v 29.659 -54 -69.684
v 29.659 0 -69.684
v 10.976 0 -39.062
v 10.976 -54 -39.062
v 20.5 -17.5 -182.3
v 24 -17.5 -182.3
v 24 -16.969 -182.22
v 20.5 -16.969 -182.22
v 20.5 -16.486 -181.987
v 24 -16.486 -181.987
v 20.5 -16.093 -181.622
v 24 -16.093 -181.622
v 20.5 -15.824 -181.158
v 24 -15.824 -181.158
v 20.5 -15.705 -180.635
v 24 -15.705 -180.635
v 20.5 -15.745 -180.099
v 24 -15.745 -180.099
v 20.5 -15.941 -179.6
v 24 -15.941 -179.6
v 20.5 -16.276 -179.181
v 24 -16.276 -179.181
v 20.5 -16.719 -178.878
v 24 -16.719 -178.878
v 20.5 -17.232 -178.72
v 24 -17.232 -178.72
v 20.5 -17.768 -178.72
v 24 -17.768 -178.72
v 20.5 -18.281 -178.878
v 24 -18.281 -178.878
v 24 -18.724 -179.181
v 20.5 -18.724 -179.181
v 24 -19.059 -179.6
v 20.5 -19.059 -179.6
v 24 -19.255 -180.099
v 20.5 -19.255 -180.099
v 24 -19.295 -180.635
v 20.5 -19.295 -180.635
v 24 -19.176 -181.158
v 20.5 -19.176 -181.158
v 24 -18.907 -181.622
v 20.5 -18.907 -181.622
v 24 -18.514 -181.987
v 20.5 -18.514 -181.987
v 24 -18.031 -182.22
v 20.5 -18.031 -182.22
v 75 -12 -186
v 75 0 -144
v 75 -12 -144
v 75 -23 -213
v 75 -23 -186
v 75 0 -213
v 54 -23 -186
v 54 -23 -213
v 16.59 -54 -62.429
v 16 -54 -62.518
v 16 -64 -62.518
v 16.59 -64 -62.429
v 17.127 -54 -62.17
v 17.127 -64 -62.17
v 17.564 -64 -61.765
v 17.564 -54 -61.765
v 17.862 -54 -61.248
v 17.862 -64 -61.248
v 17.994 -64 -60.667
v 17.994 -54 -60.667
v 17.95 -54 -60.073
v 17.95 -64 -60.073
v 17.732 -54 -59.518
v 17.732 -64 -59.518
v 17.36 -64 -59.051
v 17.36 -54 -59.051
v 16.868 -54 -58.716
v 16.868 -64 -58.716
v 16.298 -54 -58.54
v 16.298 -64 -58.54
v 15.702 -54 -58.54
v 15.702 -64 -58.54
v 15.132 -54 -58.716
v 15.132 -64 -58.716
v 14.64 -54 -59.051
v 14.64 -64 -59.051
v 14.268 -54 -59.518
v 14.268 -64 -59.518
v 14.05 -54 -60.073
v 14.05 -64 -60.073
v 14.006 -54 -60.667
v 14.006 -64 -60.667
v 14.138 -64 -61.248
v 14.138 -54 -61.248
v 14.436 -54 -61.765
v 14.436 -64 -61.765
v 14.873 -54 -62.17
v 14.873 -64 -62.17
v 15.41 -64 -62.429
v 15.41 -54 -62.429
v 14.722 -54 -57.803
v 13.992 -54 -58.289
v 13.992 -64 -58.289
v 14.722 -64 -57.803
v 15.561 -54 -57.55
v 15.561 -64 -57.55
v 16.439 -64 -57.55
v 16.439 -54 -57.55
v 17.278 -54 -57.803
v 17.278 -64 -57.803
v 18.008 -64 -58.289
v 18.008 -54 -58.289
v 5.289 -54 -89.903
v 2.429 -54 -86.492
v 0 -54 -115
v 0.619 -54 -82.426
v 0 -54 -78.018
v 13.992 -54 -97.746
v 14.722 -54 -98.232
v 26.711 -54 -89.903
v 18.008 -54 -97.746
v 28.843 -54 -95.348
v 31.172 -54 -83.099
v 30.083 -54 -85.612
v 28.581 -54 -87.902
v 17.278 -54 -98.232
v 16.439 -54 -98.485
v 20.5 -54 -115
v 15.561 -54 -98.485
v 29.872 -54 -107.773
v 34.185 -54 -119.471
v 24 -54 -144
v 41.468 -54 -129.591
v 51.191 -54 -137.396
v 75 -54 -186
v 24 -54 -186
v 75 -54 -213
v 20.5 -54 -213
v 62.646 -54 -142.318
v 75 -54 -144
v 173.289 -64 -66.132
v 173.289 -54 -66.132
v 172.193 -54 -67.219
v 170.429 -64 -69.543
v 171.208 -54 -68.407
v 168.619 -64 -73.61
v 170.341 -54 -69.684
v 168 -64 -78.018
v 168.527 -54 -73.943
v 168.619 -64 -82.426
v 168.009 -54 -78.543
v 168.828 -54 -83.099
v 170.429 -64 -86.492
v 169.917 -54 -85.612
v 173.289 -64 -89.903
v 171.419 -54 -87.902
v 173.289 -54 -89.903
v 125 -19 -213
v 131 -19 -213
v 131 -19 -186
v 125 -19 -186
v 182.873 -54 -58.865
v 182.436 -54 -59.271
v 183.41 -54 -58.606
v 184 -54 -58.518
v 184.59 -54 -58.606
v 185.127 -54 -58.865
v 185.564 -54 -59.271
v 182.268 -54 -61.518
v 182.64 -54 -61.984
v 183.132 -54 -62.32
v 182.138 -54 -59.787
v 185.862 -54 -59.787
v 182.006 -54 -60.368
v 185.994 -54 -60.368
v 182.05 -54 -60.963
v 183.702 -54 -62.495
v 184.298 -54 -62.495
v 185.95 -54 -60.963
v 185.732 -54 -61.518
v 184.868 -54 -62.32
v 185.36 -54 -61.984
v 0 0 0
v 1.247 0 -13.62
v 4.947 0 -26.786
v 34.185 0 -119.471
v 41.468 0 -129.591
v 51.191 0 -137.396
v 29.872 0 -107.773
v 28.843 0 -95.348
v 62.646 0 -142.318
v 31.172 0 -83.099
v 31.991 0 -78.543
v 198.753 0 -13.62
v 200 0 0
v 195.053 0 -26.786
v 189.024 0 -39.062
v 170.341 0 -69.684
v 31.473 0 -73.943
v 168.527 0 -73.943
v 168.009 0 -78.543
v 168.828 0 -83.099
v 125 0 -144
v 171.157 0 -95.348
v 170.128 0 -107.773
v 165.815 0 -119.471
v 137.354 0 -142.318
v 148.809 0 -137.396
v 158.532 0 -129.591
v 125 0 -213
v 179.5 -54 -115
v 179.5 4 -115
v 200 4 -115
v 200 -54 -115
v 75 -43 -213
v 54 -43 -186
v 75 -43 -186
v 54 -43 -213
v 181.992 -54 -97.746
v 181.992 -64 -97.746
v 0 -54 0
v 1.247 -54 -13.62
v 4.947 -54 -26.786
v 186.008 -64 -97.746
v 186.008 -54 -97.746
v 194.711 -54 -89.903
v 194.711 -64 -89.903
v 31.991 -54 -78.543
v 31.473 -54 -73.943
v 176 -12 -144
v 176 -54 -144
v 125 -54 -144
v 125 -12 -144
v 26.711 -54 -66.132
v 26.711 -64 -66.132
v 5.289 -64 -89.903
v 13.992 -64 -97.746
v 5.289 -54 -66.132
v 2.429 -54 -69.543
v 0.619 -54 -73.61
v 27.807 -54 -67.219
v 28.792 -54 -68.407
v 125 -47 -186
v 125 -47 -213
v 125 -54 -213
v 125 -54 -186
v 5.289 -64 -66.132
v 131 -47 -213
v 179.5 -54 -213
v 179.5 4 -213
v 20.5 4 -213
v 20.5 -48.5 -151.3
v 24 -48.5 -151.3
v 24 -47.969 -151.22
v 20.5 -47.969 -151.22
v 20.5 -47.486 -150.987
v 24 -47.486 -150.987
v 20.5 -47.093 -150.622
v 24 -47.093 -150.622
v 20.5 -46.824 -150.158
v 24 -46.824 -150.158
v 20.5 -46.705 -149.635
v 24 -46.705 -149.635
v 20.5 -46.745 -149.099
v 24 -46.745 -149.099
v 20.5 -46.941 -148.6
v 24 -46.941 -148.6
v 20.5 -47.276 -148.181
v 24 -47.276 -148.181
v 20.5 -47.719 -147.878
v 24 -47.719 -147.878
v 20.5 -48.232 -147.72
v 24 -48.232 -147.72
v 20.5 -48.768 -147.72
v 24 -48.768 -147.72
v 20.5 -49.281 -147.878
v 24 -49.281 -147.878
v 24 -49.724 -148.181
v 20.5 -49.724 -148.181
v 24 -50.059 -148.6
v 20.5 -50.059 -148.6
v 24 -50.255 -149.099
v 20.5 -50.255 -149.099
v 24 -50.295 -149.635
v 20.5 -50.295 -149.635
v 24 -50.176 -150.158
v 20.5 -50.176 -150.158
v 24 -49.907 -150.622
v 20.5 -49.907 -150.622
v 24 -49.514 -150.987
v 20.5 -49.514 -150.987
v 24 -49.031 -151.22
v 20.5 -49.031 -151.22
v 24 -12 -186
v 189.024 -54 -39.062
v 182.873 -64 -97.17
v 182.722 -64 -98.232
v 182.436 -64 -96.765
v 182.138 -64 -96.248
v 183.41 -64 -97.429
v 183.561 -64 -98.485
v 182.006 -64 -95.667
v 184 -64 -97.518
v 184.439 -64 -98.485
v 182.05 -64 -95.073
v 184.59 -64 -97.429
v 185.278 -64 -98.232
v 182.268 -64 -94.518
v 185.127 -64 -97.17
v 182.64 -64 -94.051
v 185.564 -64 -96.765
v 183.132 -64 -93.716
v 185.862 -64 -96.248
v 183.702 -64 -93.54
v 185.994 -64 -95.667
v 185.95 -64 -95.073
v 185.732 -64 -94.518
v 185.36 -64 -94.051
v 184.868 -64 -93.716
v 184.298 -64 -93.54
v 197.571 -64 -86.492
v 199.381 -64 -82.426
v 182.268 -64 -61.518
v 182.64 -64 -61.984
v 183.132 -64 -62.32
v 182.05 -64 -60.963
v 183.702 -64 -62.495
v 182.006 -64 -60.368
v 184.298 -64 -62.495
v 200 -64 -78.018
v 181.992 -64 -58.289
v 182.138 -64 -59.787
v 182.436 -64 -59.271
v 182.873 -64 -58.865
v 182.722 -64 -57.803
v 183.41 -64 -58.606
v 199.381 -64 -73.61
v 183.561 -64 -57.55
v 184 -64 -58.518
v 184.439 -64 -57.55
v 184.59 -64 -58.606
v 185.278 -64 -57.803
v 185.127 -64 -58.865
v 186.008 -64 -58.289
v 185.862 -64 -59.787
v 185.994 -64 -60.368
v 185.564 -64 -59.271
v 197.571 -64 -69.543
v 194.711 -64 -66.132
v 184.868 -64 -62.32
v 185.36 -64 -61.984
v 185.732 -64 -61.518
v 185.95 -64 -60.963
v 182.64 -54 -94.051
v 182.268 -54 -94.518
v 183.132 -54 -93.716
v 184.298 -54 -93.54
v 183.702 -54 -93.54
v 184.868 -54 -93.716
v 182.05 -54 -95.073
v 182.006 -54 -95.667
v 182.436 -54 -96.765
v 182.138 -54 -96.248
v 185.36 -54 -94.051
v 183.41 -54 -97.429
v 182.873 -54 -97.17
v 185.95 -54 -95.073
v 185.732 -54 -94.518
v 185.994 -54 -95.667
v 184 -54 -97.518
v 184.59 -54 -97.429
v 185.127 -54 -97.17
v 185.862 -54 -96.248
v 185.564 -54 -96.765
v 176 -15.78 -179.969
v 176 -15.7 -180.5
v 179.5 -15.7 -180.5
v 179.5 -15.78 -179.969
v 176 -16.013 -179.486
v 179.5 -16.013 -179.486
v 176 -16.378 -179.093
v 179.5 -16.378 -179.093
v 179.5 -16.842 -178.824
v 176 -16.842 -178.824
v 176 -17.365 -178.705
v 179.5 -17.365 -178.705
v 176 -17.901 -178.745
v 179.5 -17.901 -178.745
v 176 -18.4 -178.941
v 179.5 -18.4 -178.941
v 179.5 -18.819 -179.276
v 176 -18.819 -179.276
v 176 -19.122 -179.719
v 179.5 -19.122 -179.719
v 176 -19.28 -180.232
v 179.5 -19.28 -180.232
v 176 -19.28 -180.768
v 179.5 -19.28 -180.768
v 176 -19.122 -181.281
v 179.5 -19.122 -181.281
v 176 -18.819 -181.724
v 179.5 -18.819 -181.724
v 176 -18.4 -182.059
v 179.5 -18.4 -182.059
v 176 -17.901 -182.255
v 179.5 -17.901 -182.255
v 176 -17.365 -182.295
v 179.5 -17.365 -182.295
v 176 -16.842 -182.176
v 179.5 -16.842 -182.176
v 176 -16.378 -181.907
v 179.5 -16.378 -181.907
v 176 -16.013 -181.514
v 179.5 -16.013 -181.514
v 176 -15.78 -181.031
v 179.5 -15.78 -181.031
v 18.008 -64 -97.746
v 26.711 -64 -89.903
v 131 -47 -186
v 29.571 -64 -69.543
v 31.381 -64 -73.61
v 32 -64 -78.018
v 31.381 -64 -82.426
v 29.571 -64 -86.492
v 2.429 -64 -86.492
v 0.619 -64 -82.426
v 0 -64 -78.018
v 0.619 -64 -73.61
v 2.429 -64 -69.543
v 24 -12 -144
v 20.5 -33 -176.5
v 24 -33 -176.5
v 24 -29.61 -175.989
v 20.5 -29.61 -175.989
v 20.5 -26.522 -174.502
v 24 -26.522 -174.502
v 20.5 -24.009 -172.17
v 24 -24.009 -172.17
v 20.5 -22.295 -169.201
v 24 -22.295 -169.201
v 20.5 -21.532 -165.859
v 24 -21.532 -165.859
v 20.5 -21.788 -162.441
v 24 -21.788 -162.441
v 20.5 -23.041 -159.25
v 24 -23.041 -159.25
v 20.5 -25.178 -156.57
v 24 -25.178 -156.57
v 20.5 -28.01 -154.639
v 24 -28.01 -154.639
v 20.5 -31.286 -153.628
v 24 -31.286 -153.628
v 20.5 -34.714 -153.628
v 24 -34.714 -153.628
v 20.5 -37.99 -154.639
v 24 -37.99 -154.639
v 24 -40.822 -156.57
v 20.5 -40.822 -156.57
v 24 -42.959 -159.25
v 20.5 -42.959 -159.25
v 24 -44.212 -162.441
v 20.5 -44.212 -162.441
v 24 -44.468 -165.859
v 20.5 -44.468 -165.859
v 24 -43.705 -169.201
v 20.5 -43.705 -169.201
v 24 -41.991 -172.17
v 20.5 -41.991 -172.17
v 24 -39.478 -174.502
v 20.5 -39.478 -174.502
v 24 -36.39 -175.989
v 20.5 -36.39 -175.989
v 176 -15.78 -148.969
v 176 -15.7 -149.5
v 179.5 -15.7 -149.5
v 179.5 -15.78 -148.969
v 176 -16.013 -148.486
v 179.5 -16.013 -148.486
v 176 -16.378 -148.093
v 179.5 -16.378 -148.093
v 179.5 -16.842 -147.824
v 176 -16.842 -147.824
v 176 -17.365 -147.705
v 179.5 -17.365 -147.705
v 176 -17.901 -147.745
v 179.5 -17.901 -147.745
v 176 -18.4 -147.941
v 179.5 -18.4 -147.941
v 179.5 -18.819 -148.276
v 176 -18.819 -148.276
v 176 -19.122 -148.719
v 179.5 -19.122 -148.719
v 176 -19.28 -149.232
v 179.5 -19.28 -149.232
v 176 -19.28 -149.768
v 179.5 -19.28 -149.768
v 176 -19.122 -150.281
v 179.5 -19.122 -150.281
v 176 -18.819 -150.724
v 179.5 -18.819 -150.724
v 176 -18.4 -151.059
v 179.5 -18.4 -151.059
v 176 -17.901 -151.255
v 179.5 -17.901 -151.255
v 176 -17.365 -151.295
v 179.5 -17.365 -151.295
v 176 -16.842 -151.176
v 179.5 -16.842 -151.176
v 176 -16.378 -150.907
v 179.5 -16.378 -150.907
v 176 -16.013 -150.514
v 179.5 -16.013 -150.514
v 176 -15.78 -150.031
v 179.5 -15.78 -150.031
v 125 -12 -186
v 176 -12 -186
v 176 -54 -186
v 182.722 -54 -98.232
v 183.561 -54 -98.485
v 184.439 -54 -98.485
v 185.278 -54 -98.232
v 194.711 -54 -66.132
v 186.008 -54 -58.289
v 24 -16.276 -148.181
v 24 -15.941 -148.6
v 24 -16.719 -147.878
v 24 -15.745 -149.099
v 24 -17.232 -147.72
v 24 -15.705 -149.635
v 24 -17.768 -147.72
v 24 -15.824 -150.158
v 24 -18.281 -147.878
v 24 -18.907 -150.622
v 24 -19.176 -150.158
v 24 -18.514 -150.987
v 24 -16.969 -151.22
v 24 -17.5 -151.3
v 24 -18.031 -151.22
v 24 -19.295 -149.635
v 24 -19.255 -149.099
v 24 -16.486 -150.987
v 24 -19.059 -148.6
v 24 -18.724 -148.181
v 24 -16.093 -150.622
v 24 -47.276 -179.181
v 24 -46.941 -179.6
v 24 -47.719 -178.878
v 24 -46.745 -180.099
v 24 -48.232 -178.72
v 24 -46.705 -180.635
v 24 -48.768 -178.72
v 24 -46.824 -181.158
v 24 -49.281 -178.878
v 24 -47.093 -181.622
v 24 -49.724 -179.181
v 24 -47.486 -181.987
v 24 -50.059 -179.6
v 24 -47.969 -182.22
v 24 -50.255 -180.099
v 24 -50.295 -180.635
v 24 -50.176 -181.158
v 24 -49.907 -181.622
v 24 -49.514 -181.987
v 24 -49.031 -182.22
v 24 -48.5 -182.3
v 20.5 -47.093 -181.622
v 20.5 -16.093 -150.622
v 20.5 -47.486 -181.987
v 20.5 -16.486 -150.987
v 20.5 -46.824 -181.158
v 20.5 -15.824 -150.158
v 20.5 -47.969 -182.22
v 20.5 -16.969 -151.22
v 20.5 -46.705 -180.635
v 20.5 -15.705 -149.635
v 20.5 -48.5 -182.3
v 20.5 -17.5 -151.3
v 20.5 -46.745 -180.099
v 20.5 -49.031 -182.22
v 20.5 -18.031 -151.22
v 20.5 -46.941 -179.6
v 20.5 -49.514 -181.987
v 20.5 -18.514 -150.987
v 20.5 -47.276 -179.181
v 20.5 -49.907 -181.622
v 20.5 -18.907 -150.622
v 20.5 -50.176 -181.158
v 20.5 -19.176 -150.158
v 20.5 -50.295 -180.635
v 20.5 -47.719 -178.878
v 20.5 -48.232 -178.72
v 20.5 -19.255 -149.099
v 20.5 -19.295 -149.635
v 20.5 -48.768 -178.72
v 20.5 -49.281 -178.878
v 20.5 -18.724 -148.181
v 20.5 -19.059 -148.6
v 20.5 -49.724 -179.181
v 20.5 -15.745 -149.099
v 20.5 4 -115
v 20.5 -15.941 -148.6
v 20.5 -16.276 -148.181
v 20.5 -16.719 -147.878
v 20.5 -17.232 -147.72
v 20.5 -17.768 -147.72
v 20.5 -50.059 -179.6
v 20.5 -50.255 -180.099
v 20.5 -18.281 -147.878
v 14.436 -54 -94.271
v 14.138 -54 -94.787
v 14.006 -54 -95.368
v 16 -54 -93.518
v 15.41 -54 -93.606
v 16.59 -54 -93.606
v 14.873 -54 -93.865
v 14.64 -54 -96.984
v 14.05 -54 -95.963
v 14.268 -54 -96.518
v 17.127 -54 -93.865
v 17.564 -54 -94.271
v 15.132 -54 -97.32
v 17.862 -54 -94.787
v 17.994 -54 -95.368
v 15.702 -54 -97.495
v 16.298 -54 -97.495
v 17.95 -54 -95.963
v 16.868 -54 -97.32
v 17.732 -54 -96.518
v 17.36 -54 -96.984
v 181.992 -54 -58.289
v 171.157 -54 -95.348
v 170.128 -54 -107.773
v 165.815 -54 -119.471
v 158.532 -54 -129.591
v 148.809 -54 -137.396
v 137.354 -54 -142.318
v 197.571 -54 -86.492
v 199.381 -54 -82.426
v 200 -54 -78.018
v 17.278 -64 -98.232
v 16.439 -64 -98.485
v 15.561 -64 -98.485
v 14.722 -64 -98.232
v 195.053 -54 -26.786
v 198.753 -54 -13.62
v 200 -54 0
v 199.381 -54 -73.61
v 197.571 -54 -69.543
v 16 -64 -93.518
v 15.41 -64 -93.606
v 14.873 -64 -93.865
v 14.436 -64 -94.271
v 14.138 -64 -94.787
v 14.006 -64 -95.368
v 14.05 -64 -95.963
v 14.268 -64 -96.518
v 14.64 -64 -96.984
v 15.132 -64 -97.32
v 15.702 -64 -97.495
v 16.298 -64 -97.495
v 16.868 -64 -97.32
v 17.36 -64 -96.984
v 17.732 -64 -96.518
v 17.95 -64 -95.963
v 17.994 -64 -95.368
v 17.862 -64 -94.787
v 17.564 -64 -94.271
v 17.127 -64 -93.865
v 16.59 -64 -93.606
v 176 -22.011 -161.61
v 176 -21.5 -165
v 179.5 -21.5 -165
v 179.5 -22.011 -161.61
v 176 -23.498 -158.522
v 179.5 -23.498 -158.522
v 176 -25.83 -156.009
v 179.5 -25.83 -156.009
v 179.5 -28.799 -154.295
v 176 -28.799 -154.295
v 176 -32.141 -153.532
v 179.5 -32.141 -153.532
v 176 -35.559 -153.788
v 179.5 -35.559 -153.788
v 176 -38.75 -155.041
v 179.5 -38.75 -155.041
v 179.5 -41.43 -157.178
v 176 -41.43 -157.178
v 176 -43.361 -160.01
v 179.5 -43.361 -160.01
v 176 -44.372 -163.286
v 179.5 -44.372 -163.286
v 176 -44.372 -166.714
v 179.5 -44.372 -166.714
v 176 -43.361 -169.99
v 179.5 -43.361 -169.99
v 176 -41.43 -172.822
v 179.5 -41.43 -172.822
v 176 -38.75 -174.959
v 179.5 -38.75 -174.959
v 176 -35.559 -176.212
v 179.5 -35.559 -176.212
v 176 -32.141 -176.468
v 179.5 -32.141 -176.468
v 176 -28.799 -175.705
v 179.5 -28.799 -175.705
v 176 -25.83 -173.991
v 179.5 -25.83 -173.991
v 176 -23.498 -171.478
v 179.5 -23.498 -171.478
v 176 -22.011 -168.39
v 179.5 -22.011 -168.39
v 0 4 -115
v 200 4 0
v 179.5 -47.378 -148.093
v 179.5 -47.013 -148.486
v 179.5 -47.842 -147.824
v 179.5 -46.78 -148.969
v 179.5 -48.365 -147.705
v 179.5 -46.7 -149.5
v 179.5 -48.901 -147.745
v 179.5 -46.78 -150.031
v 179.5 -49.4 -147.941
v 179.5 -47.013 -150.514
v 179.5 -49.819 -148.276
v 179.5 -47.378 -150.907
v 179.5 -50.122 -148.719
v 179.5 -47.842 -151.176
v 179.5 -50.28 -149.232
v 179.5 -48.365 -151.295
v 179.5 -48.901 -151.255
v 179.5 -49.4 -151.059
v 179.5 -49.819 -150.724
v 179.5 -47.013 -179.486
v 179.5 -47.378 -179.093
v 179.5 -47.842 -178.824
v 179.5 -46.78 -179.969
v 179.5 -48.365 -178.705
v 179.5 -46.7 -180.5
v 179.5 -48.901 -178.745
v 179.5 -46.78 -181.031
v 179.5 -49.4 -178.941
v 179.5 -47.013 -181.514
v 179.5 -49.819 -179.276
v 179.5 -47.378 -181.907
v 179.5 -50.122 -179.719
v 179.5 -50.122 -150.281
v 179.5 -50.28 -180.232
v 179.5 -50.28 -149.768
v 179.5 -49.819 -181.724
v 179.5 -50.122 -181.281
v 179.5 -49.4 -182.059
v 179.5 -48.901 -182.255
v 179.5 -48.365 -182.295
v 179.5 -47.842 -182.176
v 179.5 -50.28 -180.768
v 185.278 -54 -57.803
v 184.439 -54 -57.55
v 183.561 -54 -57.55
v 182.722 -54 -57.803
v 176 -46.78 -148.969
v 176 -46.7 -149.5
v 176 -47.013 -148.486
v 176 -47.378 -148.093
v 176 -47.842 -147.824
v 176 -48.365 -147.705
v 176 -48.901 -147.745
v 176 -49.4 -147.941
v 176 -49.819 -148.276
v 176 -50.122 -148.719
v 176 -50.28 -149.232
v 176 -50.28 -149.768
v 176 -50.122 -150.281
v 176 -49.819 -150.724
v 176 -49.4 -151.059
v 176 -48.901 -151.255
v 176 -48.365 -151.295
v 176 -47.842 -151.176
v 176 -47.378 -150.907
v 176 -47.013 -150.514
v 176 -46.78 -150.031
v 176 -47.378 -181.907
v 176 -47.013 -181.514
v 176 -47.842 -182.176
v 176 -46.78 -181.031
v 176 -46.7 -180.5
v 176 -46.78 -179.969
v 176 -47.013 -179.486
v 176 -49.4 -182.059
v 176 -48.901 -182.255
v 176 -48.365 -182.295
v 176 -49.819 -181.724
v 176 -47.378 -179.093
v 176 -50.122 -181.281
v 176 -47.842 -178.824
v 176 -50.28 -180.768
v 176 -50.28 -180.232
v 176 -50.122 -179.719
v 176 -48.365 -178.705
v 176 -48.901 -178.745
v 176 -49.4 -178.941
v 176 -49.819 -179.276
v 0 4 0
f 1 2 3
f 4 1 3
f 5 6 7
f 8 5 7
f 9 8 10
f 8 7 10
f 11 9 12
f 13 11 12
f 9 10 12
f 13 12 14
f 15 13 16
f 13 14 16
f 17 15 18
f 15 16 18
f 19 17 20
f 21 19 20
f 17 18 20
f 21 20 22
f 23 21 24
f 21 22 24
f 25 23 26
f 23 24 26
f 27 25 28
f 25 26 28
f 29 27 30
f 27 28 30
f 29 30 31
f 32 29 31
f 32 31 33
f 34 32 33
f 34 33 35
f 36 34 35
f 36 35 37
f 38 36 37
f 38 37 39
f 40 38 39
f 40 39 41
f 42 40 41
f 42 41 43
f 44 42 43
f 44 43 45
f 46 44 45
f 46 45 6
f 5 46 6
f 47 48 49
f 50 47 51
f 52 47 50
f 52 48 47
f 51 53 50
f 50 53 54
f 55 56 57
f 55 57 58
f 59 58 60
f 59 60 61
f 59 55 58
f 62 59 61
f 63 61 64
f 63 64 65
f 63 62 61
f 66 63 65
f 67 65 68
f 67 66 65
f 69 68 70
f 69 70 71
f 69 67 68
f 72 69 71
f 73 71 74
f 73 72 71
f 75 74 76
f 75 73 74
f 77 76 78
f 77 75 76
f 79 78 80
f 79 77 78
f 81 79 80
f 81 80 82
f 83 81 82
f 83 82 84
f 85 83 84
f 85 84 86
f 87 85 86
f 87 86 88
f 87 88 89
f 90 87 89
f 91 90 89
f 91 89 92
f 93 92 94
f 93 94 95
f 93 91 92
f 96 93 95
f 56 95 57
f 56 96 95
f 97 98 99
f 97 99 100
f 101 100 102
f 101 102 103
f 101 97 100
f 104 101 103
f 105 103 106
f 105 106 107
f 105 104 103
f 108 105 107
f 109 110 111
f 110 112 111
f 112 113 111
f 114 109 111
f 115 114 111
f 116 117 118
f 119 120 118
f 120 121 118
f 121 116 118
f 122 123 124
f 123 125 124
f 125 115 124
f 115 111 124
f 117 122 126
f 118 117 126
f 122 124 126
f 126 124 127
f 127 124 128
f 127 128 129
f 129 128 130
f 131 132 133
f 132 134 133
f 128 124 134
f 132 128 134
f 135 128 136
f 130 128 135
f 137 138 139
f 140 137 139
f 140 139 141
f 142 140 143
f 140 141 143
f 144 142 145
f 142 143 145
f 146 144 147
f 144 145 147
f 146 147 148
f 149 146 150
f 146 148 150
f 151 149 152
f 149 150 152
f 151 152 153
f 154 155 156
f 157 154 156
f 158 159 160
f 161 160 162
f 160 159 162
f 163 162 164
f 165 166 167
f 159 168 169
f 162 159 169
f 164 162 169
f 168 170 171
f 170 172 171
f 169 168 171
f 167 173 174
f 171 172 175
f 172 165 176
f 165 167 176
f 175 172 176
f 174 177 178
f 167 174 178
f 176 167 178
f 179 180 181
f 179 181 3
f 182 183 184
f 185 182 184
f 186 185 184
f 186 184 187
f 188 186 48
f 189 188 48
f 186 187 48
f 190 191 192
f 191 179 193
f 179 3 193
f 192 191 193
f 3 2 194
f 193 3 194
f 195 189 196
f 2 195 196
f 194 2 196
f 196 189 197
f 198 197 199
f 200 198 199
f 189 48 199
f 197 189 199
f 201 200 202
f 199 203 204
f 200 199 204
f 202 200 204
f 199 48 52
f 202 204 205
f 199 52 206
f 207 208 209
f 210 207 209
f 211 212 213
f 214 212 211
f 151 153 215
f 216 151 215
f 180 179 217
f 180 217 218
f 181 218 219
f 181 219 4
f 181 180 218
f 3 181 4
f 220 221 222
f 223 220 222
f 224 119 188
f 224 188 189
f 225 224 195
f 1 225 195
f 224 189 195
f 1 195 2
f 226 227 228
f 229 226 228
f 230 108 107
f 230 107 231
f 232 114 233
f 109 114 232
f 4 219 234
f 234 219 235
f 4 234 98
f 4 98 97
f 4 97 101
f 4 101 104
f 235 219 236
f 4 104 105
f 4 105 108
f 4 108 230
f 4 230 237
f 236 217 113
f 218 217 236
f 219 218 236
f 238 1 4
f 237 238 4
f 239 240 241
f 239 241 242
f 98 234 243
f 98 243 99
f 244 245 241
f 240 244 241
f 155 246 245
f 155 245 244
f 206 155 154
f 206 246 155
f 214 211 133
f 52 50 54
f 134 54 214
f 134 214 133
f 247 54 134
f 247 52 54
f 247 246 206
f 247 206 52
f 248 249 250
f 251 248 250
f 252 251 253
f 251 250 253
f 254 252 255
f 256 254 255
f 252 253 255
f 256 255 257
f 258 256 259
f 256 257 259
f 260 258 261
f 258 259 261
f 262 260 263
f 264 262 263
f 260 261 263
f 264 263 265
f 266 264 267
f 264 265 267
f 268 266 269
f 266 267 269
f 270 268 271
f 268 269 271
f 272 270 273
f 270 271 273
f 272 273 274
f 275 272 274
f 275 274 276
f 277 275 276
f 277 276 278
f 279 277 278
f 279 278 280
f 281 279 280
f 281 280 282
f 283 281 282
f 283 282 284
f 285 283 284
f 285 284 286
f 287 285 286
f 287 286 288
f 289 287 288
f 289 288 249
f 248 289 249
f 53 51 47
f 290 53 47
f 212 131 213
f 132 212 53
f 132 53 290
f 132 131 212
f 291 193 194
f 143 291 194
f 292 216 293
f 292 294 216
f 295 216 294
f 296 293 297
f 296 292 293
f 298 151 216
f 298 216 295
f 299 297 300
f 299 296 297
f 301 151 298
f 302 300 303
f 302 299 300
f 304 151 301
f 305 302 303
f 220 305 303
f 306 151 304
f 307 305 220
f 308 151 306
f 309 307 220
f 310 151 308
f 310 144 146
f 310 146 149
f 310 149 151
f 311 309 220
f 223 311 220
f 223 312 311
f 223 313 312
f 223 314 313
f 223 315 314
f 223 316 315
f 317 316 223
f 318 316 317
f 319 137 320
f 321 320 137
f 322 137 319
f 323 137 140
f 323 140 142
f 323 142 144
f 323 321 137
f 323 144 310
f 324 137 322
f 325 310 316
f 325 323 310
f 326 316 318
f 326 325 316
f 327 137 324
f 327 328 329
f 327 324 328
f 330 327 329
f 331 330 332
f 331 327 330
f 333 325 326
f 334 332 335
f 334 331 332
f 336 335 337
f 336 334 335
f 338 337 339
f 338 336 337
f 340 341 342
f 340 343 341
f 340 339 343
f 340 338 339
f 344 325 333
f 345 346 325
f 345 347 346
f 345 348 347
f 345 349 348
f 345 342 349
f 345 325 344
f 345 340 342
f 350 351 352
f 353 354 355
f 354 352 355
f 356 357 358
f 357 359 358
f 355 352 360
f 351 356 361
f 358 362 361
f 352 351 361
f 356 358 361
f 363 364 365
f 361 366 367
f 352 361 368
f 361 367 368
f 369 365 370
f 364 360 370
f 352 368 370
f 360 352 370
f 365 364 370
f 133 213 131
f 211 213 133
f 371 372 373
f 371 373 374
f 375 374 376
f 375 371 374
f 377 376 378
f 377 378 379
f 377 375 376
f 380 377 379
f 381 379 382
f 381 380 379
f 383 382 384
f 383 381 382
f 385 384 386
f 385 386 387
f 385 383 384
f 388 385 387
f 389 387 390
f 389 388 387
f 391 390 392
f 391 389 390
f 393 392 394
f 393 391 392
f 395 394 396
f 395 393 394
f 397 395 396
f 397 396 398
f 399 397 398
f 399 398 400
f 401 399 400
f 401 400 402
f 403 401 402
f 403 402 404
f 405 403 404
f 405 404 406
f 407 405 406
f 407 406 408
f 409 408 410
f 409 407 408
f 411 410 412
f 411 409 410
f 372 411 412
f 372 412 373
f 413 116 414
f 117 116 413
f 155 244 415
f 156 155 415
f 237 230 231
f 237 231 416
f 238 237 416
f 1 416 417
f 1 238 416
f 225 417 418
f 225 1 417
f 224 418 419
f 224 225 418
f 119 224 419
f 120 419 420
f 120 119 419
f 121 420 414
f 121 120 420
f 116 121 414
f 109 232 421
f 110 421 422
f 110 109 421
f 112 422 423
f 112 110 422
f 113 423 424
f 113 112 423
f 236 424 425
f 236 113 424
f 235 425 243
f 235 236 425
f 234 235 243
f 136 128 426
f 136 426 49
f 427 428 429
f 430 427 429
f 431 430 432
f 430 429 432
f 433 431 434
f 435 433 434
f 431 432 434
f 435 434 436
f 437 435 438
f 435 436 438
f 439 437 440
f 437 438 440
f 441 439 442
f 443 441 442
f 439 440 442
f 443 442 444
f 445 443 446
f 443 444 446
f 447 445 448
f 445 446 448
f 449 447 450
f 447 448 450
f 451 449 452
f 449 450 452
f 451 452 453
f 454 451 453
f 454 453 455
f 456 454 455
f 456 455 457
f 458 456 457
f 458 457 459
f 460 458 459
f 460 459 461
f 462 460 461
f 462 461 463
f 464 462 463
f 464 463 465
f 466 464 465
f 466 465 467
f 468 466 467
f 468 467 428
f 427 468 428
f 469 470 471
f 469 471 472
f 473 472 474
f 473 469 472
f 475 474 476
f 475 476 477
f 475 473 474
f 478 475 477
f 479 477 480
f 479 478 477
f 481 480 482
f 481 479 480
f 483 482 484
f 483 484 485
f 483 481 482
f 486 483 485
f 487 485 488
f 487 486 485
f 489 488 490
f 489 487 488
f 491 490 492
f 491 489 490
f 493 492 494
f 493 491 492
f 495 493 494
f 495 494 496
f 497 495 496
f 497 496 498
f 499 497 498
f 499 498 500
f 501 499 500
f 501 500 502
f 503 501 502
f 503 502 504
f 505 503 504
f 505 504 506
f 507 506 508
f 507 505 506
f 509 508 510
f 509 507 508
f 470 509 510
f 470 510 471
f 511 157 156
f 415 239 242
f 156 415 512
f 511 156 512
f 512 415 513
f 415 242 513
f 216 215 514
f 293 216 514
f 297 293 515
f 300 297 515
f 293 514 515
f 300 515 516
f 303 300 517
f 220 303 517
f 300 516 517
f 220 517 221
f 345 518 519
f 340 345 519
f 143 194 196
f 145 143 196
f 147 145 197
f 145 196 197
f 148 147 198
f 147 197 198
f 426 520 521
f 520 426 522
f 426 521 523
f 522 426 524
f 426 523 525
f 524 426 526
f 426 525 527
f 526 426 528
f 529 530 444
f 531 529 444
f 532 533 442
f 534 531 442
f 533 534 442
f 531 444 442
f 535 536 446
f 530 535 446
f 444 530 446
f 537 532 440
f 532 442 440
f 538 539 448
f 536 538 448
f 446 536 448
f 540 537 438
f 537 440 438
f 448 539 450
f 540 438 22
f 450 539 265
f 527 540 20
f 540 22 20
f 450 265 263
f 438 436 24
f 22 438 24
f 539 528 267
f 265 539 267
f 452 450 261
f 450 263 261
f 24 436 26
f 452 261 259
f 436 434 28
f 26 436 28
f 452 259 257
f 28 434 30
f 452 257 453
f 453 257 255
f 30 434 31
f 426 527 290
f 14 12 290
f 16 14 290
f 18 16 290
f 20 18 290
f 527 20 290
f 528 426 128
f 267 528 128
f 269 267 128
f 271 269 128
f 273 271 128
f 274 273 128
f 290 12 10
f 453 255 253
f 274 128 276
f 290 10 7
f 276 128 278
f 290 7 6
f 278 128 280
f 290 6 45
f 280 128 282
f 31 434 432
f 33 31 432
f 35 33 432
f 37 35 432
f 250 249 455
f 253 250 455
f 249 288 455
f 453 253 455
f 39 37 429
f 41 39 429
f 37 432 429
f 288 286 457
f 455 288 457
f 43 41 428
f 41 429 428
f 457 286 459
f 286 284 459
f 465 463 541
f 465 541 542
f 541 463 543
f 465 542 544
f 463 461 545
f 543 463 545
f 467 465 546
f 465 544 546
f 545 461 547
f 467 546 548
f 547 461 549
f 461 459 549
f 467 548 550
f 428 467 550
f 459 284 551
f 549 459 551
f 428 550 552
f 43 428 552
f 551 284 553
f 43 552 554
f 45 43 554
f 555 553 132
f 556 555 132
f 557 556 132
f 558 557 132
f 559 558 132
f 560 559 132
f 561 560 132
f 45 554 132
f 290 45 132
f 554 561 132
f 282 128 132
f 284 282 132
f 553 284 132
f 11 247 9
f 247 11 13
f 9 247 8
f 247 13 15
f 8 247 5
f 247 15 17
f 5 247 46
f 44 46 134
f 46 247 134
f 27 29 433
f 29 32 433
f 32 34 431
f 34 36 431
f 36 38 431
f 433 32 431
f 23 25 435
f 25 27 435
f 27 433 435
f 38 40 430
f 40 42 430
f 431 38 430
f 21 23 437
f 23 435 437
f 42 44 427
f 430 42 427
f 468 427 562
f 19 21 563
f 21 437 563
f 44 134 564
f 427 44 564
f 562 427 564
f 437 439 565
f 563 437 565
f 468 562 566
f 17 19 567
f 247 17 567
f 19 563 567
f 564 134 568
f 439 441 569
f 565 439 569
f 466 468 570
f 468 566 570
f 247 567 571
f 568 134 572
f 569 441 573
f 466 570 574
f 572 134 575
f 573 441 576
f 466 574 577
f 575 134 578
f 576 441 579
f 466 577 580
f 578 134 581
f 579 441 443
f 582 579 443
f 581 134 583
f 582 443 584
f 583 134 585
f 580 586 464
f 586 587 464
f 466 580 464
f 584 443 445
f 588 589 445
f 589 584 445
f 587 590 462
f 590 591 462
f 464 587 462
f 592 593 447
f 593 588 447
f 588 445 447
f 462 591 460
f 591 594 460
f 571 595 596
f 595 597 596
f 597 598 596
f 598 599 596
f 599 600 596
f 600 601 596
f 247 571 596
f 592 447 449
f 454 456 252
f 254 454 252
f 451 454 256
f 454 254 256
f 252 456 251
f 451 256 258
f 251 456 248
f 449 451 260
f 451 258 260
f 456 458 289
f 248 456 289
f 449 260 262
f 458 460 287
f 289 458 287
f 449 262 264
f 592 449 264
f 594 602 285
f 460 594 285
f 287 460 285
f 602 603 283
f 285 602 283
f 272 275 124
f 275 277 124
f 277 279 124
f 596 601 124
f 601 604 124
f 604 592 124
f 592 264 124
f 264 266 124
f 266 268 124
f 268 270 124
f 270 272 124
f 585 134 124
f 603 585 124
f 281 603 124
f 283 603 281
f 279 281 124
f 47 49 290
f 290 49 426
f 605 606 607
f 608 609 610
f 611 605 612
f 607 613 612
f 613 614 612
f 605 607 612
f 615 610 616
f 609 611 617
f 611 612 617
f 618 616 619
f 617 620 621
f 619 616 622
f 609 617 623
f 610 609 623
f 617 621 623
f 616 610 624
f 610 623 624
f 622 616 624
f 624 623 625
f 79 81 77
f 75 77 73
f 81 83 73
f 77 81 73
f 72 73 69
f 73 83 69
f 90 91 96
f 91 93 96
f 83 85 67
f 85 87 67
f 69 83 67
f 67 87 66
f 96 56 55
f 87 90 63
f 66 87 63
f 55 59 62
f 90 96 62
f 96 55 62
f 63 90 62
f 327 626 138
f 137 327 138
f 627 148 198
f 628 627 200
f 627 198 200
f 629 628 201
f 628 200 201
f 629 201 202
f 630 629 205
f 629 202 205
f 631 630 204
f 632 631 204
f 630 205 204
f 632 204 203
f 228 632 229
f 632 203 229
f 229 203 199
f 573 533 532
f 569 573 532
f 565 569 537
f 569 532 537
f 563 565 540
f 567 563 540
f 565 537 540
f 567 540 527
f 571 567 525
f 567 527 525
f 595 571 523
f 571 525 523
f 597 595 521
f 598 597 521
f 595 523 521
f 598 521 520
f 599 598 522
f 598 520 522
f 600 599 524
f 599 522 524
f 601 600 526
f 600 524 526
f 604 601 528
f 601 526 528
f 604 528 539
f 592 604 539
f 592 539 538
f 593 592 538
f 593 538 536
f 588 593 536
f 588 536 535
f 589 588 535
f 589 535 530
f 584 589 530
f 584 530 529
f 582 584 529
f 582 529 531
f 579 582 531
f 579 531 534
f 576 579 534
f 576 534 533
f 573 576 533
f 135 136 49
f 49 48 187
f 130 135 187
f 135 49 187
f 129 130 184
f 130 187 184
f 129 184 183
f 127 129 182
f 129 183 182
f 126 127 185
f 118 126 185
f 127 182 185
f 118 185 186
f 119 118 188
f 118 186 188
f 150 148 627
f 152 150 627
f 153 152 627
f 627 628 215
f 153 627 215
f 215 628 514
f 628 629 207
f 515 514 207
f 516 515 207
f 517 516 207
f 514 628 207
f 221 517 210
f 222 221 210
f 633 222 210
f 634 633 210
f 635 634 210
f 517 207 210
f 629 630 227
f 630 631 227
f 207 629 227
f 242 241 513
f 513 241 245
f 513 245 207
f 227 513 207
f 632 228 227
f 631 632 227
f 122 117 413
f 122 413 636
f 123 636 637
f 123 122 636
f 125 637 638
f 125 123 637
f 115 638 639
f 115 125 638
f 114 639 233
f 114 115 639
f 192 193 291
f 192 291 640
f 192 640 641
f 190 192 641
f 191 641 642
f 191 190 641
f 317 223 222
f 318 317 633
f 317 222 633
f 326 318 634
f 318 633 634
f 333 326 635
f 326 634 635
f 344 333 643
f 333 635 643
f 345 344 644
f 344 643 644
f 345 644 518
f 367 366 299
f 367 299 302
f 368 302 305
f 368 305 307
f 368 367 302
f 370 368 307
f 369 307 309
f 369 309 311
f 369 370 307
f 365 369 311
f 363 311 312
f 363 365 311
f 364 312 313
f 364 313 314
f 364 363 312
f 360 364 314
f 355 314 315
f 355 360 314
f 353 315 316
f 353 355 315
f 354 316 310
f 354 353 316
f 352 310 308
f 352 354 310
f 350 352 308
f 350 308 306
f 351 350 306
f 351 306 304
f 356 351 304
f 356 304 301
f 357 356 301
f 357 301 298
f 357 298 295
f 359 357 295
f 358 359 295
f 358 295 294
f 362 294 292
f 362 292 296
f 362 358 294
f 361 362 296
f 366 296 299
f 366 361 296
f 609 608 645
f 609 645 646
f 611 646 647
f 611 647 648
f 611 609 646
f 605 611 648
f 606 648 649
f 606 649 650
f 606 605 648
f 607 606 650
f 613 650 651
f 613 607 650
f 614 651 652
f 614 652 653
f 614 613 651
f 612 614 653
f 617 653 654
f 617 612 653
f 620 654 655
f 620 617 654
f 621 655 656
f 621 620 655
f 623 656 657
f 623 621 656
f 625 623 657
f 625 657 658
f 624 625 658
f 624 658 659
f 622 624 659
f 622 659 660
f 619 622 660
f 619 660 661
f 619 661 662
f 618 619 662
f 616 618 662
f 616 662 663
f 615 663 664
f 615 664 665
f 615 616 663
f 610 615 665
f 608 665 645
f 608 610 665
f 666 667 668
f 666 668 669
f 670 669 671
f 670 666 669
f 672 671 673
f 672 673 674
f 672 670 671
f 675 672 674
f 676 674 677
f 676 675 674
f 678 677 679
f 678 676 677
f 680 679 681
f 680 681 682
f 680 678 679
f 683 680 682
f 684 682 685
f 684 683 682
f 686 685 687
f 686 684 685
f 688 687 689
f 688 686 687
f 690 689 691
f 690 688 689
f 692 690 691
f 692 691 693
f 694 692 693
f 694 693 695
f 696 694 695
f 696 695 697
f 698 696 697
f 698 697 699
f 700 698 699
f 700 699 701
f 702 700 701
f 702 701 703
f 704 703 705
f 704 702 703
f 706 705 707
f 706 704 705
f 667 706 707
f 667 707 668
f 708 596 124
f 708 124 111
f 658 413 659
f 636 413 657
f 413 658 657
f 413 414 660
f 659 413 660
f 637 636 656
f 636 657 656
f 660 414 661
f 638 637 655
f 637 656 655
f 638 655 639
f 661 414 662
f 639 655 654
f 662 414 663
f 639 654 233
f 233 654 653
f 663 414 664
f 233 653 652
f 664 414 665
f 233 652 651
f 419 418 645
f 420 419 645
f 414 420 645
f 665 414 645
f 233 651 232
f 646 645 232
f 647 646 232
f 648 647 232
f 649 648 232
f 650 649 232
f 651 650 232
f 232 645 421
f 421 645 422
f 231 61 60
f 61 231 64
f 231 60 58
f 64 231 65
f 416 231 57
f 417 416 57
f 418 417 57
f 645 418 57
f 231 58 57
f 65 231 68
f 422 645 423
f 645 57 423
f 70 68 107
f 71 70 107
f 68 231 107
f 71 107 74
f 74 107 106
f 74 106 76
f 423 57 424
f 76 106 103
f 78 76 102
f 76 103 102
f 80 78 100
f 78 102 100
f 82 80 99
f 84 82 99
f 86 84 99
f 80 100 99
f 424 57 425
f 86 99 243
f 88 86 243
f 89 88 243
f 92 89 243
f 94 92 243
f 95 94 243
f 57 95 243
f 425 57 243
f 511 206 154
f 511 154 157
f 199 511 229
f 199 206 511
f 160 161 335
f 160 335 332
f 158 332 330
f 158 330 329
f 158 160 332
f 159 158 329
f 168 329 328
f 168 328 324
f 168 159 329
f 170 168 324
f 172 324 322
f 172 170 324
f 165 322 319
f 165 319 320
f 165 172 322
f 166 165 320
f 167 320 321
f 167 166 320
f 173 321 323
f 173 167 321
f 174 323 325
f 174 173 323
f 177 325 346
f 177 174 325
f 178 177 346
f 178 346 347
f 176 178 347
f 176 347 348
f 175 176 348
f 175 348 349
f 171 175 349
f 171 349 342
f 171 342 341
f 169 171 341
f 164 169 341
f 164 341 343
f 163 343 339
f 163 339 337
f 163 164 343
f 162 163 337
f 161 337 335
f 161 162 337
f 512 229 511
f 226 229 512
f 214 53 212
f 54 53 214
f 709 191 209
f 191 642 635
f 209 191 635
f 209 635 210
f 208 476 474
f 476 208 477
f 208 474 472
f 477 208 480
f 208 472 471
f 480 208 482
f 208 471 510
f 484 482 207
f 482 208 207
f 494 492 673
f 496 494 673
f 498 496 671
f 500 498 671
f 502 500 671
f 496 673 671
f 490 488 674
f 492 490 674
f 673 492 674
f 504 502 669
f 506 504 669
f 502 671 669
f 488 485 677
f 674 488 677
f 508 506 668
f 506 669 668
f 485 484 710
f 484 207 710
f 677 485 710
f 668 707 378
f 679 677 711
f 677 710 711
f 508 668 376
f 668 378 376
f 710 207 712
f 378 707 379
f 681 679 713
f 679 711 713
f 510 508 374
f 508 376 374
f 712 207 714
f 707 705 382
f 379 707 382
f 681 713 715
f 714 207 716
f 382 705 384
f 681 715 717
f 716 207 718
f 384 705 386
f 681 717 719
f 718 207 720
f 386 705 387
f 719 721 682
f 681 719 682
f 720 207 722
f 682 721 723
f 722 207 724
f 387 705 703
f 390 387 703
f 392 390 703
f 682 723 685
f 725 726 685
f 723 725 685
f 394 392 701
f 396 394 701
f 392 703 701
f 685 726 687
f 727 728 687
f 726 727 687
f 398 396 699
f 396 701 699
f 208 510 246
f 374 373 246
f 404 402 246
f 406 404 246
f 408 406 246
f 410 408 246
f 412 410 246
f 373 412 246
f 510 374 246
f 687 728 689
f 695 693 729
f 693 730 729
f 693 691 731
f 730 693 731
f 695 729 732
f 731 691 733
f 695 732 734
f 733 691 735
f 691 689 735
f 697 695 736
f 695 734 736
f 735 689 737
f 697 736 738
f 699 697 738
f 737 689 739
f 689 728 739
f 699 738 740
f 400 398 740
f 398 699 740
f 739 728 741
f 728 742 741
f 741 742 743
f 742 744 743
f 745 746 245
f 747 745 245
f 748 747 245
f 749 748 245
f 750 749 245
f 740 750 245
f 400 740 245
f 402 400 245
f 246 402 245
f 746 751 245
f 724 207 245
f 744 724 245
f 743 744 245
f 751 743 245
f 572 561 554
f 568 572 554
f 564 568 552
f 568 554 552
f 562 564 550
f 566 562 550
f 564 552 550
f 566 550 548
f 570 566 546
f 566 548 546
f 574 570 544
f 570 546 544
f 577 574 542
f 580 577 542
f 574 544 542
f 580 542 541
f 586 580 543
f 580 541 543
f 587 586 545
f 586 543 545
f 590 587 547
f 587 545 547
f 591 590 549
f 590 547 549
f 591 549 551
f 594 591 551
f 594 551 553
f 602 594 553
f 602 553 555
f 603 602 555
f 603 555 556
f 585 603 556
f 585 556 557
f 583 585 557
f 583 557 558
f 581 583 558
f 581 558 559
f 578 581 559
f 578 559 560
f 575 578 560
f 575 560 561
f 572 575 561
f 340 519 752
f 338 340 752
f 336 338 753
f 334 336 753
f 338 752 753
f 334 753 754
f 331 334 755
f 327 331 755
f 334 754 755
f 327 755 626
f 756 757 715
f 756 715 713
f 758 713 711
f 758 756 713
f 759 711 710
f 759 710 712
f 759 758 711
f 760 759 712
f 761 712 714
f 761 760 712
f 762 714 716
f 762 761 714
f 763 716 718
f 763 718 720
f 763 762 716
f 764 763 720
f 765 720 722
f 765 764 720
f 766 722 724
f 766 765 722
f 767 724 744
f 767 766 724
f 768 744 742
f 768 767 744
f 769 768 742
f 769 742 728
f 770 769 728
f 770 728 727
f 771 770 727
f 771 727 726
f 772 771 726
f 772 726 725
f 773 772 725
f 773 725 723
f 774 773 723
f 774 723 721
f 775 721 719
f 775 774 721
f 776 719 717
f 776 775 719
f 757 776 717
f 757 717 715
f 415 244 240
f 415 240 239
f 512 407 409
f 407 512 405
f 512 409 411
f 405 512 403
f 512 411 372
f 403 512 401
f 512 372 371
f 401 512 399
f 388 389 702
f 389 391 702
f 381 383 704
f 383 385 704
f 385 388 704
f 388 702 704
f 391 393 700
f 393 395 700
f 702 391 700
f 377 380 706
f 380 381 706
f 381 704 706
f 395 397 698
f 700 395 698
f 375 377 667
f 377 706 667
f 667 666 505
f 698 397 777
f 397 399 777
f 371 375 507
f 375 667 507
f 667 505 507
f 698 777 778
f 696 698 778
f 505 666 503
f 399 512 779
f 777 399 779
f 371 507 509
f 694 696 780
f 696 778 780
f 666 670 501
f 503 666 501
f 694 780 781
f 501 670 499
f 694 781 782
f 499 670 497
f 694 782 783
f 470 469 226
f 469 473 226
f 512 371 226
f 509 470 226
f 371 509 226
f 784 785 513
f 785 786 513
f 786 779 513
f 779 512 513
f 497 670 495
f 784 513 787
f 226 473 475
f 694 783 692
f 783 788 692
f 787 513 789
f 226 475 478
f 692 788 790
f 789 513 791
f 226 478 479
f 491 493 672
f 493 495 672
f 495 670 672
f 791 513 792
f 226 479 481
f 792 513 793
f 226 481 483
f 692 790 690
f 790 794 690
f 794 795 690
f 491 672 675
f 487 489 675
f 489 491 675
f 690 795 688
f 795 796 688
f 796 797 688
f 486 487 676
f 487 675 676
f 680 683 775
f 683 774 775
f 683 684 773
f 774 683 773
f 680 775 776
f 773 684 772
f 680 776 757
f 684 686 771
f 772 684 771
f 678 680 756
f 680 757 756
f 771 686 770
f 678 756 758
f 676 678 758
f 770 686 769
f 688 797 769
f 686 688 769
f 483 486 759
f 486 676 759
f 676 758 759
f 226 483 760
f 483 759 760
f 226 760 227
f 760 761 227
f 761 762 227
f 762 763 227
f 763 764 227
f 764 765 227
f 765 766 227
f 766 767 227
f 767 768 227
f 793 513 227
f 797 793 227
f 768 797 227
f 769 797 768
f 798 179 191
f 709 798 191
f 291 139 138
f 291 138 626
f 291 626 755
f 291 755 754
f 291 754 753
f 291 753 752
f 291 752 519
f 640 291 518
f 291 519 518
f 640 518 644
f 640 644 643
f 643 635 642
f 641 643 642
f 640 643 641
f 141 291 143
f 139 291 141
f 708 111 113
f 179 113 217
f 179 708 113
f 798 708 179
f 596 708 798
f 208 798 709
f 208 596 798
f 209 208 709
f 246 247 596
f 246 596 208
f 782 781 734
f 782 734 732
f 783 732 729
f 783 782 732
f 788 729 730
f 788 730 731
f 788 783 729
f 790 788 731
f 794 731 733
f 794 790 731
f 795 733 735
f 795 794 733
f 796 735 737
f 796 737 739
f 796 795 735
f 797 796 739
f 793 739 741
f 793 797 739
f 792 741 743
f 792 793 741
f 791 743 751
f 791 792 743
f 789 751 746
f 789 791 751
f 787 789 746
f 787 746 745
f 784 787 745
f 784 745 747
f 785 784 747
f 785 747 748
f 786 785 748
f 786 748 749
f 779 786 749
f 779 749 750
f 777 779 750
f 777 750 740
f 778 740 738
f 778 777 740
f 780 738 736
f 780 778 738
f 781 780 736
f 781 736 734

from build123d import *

# Parameters (mm, degrees)
SKETCH_1_W              = 200
SKETCH_1_H              = 213
EXTRUDE_1_DEPTH         = 4
EXTRUDE_2_DEPTH         = 54
CUT_EXTRUDE_2_DEPTH     = 298.880848663
CUT_EXTRUDE_3_DEPTH     = 42
SKETCH_7_R              = 1.8
SKETCH_7_R_2            = 11.5
CUT_EXTRUDE_4_DEPTH     = 282.53330176
MIRROR_START            = 176
MIRROR_1_OUTLINE_R      = 1.8
MIRROR_1_OUTLINE_R_2    = 11.5
MIRROR_1_DEPTH          = 3.5
CUT_EXTRUDE_START       = -21
CUT_EXTRUDE_5_OUTLINE_W = 27
CUT_EXTRUDE_5_OUTLINE_H = 20
CUT_EXTRUDE_5_DEPTH     = 21
CUT_EXTRUDE_START_2     = -6
CUT_EXTRUDE_6_OUTLINE_W = 27
CUT_EXTRUDE_6_OUTLINE_H = 28
CUT_EXTRUDE_6_DEPTH     = 6
CUT_EXTRUDE_START_3     = -54
CUT_EXTRUDE_7_DEPTH     = 54
SKETCH_12_R             = 2
EXTRUDE_3_DEPTH         = 10


# Read off the part's stored shape, not the designer's step: 镜向1, 切除-拉伸5, 切除-拉伸6
with BuildPart() as part:
    # 草图1 → 凸台-拉伸1 (new body)
    with BuildSketch(Plane(origin=(0, 0, 0), x_dir=(1, 0, 0), z_dir=(0, 1, 0))):
        with Locations((100, 106.5)):
            Rectangle(SKETCH_1_W, SKETCH_1_H)
    extrude(amount=EXTRUDE_1_DEPTH)

    # 草图1<4> → 凸台-拉伸2 (add)
    with BuildSketch(Plane(origin=(0, 0, 0), x_dir=(1, 0, 0), z_dir=(0, 1, 0))):
        with BuildLine():
            Line((0, 213), (0, 0))
            ThreePointArc((0, 0), (21.966991411, 53.033008589), (75, 75))
            Line((75, 75), (75, 213))
            Line((75, 213), (0, 213))
        make_face()
        with BuildLine():
            Line((125, 213), (125, 75))
            ThreePointArc((125, 75), (178.033008589, 53.033008589), (200, 0))
            Line((200, 0), (200, 213))
            Line((200, 213), (125, 213))
        make_face()
    extrude(amount=-EXTRUDE_2_DEPTH)

    # 草图3 → 切除-拉伸2 (cut, through all)
    with BuildSketch(Plane.XZ.offset(54)):
        Polygon((20.5, -186), (20.5, -165), (20.5, -144), (20.5, -115), (0, -115), (0, -213), (20.5, -213), align=None)
        Polygon((179.5, -115), (200, -115), (200, -213), (179.5, -213), (179.5, -165), align=None)
    extrude(amount=-CUT_EXTRUDE_2_DEPTH, mode=Mode.SUBTRACT)

    # 草图5 → 切除-拉伸3 (cut)
    with BuildSketch(Plane.XZ.offset(54)):
        Polygon((176, -164), (176, -144), (125, -144), (125, -186), (176, -186), align=None)
        Polygon((24, -164), (24, -144), (75, -144), (75, -186), (24, -186), align=None)
    extrude(amount=-CUT_EXTRUDE_3_DEPTH, mode=Mode.SUBTRACT)

    # 草图7 → 切除-拉伸4 (cut, through all)
    with BuildSketch(Plane(origin=(24, 0, 0), x_dir=(0, 0, -1), z_dir=(1, 0, 0))):
        with Locations((180.5, -17.5)):
            Circle(SKETCH_7_R)
        with Locations((149.5, -17.5)):
            Circle(SKETCH_7_R)
        with Locations((165, -33)):
            Circle(SKETCH_7_R_2)
        with Locations((180.5, -48.5)):
            Circle(SKETCH_7_R)
        with Locations((149.5, -48.5)):
            Circle(SKETCH_7_R)
    extrude(amount=-CUT_EXTRUDE_4_DEPTH, mode=Mode.SUBTRACT)

    # 镜向1 outline → 镜向1 (cut)
    with BuildSketch(Plane.YZ.offset(MIRROR_START)):
        with Locations((-17.5, -180.5)):
            Circle(MIRROR_1_OUTLINE_R)
        with Locations((-17.5, -149.5)):
            Circle(MIRROR_1_OUTLINE_R)
        with Locations((-33, -165)):
            Circle(MIRROR_1_OUTLINE_R_2)
        with Locations((-48.5, -180.5)):
            Circle(MIRROR_1_OUTLINE_R)
        with Locations((-48.5, -149.5)):
            Circle(MIRROR_1_OUTLINE_R)
    extrude(amount=MIRROR_1_DEPTH, mode=Mode.SUBTRACT)

    # 切除-拉伸5 outline → 切除-拉伸5 (cut)
    with BuildSketch(Plane(origin=(75, 0, 0), x_dir=(0, 0, -1), z_dir=(1, 0, 0)).offset(CUT_EXTRUDE_START)):
        with Locations((199.5, -33)):
            Rectangle(CUT_EXTRUDE_5_OUTLINE_W, CUT_EXTRUDE_5_OUTLINE_H)
    extrude(amount=CUT_EXTRUDE_5_DEPTH, mode=Mode.SUBTRACT)

    # 切除-拉伸6 outline → 切除-拉伸6 (cut)
    with BuildSketch(Plane.ZY.offset(-125).offset(CUT_EXTRUDE_START_2)):
        with Locations((-199.5, -33)):
            Rectangle(CUT_EXTRUDE_6_OUTLINE_W, CUT_EXTRUDE_6_OUTLINE_H)
    extrude(amount=CUT_EXTRUDE_6_DEPTH, mode=Mode.SUBTRACT)

    # 草图11 → 切除-拉伸7 (cut)
    with BuildSketch(Plane.XZ.offset(54).offset(CUT_EXTRUDE_START_3)):
        with BuildLine():
            Line((29.658534166, -69.684244774), (10.975621098, -39.0625))
            ThreePointArc((10.975621098, -39.0625), (38.289562111, -65.401404801), (75, -75))
            Line((75, -75), (75, -144))
            ThreePointArc((75, -144), (37.483837038, -124.777752739), (31.171635941, -83.099060455))
            ThreePointArc((31.171635941, -83.099060455), (31.899182276, -76.224256342), (29.658534166, -69.684244774))
        make_face()
        with BuildLine():
            Line((125, -144), (125, -75))
            ThreePointArc((125, -75), (161.710437889, -65.401404801), (189.024378902, -39.0625))
            Line((189.024378902, -39.0625), (170.341465834, -69.684244774))
            ThreePointArc((170.341465834, -69.684244774), (168.100817724, -76.224256342), (168.828364059, -83.099060455))
            ThreePointArc((168.828364059, -83.099060455), (162.516162962, -124.777752739), (125, -144))
        make_face()
    extrude(amount=CUT_EXTRUDE_7_DEPTH, mode=Mode.SUBTRACT)

    # 草图12 → 凸台-拉伸3 (add)
    # profile 1 of 2: a face of its own
    with BuildSketch(Plane.XZ.offset(54)):
        with BuildLine():
            Line((18.008349917, -58.289006678), (26.711199556, -66.131863821))
            ThreePointArc((26.711199556, -66.131863821), (32, -78.017578107), (26.711199556, -89.903292393))
            Line((26.711199556, -89.903292393), (18.008349917, -97.746149535))
            ThreePointArc((18.008349917, -97.746149535), (16, -98.517578107), (13.991650083, -97.746149535))
            Line((13.991650083, -97.746149535), (5.288800444, -89.903292393))
            ThreePointArc((5.288800444, -89.903292393), (0, -78.017578107), (5.288800444, -66.131863821))
            Line((5.288800444, -66.131863821), (13.991650083, -58.289006678))
            ThreePointArc((13.991650083, -58.289006678), (16, -57.517578107), (18.008349917, -58.289006678))
        make_face()
        with Locations(Location((16, -60.517578107, 0), (0, 0, 270))):
            Circle(SKETCH_12_R, mode=Mode.SUBTRACT)
        with Locations(Location((16, -95.517578107, 0), (0, 0, 90))):
            Circle(SKETCH_12_R, mode=Mode.SUBTRACT)
    # profile 2 of 2: a face of its own
    with BuildSketch(Plane.XZ.offset(54)):
        with BuildLine():
            Line((186.008349917, -97.746149535), (194.711199556, -89.903292393))
            ThreePointArc((194.711199556, -89.903292393), (200, -78.017578107), (194.711199556, -66.131863821))
            Line((194.711199556, -66.131863821), (186.008349917, -58.289006678))
            ThreePointArc((186.008349917, -58.289006678), (184, -57.517578107), (181.991650083, -58.289006678))
            Line((181.991650083, -58.289006678), (173.288800444, -66.131863821))
            ThreePointArc((173.288800444, -66.131863821), (168, -78.017578107), (173.288800444, -89.903292393))
            Line((173.288800444, -89.903292393), (181.991650083, -97.746149535))
            ThreePointArc((181.991650083, -97.746149535), (184, -98.517578107), (186.008349917, -97.746149535))
        make_face()
        with Locations(Location((184, -95.517578107, 0), (0, 0, 270))):
            Circle(SKETCH_12_R, mode=Mode.SUBTRACT)
        with Locations(Location((184, -60.517578107, 0), (0, 0, 90))):
            Circle(SKETCH_12_R, mode=Mode.SUBTRACT)
    extrude(amount=EXTRUDE_3_DEPTH)


solid = part.part
